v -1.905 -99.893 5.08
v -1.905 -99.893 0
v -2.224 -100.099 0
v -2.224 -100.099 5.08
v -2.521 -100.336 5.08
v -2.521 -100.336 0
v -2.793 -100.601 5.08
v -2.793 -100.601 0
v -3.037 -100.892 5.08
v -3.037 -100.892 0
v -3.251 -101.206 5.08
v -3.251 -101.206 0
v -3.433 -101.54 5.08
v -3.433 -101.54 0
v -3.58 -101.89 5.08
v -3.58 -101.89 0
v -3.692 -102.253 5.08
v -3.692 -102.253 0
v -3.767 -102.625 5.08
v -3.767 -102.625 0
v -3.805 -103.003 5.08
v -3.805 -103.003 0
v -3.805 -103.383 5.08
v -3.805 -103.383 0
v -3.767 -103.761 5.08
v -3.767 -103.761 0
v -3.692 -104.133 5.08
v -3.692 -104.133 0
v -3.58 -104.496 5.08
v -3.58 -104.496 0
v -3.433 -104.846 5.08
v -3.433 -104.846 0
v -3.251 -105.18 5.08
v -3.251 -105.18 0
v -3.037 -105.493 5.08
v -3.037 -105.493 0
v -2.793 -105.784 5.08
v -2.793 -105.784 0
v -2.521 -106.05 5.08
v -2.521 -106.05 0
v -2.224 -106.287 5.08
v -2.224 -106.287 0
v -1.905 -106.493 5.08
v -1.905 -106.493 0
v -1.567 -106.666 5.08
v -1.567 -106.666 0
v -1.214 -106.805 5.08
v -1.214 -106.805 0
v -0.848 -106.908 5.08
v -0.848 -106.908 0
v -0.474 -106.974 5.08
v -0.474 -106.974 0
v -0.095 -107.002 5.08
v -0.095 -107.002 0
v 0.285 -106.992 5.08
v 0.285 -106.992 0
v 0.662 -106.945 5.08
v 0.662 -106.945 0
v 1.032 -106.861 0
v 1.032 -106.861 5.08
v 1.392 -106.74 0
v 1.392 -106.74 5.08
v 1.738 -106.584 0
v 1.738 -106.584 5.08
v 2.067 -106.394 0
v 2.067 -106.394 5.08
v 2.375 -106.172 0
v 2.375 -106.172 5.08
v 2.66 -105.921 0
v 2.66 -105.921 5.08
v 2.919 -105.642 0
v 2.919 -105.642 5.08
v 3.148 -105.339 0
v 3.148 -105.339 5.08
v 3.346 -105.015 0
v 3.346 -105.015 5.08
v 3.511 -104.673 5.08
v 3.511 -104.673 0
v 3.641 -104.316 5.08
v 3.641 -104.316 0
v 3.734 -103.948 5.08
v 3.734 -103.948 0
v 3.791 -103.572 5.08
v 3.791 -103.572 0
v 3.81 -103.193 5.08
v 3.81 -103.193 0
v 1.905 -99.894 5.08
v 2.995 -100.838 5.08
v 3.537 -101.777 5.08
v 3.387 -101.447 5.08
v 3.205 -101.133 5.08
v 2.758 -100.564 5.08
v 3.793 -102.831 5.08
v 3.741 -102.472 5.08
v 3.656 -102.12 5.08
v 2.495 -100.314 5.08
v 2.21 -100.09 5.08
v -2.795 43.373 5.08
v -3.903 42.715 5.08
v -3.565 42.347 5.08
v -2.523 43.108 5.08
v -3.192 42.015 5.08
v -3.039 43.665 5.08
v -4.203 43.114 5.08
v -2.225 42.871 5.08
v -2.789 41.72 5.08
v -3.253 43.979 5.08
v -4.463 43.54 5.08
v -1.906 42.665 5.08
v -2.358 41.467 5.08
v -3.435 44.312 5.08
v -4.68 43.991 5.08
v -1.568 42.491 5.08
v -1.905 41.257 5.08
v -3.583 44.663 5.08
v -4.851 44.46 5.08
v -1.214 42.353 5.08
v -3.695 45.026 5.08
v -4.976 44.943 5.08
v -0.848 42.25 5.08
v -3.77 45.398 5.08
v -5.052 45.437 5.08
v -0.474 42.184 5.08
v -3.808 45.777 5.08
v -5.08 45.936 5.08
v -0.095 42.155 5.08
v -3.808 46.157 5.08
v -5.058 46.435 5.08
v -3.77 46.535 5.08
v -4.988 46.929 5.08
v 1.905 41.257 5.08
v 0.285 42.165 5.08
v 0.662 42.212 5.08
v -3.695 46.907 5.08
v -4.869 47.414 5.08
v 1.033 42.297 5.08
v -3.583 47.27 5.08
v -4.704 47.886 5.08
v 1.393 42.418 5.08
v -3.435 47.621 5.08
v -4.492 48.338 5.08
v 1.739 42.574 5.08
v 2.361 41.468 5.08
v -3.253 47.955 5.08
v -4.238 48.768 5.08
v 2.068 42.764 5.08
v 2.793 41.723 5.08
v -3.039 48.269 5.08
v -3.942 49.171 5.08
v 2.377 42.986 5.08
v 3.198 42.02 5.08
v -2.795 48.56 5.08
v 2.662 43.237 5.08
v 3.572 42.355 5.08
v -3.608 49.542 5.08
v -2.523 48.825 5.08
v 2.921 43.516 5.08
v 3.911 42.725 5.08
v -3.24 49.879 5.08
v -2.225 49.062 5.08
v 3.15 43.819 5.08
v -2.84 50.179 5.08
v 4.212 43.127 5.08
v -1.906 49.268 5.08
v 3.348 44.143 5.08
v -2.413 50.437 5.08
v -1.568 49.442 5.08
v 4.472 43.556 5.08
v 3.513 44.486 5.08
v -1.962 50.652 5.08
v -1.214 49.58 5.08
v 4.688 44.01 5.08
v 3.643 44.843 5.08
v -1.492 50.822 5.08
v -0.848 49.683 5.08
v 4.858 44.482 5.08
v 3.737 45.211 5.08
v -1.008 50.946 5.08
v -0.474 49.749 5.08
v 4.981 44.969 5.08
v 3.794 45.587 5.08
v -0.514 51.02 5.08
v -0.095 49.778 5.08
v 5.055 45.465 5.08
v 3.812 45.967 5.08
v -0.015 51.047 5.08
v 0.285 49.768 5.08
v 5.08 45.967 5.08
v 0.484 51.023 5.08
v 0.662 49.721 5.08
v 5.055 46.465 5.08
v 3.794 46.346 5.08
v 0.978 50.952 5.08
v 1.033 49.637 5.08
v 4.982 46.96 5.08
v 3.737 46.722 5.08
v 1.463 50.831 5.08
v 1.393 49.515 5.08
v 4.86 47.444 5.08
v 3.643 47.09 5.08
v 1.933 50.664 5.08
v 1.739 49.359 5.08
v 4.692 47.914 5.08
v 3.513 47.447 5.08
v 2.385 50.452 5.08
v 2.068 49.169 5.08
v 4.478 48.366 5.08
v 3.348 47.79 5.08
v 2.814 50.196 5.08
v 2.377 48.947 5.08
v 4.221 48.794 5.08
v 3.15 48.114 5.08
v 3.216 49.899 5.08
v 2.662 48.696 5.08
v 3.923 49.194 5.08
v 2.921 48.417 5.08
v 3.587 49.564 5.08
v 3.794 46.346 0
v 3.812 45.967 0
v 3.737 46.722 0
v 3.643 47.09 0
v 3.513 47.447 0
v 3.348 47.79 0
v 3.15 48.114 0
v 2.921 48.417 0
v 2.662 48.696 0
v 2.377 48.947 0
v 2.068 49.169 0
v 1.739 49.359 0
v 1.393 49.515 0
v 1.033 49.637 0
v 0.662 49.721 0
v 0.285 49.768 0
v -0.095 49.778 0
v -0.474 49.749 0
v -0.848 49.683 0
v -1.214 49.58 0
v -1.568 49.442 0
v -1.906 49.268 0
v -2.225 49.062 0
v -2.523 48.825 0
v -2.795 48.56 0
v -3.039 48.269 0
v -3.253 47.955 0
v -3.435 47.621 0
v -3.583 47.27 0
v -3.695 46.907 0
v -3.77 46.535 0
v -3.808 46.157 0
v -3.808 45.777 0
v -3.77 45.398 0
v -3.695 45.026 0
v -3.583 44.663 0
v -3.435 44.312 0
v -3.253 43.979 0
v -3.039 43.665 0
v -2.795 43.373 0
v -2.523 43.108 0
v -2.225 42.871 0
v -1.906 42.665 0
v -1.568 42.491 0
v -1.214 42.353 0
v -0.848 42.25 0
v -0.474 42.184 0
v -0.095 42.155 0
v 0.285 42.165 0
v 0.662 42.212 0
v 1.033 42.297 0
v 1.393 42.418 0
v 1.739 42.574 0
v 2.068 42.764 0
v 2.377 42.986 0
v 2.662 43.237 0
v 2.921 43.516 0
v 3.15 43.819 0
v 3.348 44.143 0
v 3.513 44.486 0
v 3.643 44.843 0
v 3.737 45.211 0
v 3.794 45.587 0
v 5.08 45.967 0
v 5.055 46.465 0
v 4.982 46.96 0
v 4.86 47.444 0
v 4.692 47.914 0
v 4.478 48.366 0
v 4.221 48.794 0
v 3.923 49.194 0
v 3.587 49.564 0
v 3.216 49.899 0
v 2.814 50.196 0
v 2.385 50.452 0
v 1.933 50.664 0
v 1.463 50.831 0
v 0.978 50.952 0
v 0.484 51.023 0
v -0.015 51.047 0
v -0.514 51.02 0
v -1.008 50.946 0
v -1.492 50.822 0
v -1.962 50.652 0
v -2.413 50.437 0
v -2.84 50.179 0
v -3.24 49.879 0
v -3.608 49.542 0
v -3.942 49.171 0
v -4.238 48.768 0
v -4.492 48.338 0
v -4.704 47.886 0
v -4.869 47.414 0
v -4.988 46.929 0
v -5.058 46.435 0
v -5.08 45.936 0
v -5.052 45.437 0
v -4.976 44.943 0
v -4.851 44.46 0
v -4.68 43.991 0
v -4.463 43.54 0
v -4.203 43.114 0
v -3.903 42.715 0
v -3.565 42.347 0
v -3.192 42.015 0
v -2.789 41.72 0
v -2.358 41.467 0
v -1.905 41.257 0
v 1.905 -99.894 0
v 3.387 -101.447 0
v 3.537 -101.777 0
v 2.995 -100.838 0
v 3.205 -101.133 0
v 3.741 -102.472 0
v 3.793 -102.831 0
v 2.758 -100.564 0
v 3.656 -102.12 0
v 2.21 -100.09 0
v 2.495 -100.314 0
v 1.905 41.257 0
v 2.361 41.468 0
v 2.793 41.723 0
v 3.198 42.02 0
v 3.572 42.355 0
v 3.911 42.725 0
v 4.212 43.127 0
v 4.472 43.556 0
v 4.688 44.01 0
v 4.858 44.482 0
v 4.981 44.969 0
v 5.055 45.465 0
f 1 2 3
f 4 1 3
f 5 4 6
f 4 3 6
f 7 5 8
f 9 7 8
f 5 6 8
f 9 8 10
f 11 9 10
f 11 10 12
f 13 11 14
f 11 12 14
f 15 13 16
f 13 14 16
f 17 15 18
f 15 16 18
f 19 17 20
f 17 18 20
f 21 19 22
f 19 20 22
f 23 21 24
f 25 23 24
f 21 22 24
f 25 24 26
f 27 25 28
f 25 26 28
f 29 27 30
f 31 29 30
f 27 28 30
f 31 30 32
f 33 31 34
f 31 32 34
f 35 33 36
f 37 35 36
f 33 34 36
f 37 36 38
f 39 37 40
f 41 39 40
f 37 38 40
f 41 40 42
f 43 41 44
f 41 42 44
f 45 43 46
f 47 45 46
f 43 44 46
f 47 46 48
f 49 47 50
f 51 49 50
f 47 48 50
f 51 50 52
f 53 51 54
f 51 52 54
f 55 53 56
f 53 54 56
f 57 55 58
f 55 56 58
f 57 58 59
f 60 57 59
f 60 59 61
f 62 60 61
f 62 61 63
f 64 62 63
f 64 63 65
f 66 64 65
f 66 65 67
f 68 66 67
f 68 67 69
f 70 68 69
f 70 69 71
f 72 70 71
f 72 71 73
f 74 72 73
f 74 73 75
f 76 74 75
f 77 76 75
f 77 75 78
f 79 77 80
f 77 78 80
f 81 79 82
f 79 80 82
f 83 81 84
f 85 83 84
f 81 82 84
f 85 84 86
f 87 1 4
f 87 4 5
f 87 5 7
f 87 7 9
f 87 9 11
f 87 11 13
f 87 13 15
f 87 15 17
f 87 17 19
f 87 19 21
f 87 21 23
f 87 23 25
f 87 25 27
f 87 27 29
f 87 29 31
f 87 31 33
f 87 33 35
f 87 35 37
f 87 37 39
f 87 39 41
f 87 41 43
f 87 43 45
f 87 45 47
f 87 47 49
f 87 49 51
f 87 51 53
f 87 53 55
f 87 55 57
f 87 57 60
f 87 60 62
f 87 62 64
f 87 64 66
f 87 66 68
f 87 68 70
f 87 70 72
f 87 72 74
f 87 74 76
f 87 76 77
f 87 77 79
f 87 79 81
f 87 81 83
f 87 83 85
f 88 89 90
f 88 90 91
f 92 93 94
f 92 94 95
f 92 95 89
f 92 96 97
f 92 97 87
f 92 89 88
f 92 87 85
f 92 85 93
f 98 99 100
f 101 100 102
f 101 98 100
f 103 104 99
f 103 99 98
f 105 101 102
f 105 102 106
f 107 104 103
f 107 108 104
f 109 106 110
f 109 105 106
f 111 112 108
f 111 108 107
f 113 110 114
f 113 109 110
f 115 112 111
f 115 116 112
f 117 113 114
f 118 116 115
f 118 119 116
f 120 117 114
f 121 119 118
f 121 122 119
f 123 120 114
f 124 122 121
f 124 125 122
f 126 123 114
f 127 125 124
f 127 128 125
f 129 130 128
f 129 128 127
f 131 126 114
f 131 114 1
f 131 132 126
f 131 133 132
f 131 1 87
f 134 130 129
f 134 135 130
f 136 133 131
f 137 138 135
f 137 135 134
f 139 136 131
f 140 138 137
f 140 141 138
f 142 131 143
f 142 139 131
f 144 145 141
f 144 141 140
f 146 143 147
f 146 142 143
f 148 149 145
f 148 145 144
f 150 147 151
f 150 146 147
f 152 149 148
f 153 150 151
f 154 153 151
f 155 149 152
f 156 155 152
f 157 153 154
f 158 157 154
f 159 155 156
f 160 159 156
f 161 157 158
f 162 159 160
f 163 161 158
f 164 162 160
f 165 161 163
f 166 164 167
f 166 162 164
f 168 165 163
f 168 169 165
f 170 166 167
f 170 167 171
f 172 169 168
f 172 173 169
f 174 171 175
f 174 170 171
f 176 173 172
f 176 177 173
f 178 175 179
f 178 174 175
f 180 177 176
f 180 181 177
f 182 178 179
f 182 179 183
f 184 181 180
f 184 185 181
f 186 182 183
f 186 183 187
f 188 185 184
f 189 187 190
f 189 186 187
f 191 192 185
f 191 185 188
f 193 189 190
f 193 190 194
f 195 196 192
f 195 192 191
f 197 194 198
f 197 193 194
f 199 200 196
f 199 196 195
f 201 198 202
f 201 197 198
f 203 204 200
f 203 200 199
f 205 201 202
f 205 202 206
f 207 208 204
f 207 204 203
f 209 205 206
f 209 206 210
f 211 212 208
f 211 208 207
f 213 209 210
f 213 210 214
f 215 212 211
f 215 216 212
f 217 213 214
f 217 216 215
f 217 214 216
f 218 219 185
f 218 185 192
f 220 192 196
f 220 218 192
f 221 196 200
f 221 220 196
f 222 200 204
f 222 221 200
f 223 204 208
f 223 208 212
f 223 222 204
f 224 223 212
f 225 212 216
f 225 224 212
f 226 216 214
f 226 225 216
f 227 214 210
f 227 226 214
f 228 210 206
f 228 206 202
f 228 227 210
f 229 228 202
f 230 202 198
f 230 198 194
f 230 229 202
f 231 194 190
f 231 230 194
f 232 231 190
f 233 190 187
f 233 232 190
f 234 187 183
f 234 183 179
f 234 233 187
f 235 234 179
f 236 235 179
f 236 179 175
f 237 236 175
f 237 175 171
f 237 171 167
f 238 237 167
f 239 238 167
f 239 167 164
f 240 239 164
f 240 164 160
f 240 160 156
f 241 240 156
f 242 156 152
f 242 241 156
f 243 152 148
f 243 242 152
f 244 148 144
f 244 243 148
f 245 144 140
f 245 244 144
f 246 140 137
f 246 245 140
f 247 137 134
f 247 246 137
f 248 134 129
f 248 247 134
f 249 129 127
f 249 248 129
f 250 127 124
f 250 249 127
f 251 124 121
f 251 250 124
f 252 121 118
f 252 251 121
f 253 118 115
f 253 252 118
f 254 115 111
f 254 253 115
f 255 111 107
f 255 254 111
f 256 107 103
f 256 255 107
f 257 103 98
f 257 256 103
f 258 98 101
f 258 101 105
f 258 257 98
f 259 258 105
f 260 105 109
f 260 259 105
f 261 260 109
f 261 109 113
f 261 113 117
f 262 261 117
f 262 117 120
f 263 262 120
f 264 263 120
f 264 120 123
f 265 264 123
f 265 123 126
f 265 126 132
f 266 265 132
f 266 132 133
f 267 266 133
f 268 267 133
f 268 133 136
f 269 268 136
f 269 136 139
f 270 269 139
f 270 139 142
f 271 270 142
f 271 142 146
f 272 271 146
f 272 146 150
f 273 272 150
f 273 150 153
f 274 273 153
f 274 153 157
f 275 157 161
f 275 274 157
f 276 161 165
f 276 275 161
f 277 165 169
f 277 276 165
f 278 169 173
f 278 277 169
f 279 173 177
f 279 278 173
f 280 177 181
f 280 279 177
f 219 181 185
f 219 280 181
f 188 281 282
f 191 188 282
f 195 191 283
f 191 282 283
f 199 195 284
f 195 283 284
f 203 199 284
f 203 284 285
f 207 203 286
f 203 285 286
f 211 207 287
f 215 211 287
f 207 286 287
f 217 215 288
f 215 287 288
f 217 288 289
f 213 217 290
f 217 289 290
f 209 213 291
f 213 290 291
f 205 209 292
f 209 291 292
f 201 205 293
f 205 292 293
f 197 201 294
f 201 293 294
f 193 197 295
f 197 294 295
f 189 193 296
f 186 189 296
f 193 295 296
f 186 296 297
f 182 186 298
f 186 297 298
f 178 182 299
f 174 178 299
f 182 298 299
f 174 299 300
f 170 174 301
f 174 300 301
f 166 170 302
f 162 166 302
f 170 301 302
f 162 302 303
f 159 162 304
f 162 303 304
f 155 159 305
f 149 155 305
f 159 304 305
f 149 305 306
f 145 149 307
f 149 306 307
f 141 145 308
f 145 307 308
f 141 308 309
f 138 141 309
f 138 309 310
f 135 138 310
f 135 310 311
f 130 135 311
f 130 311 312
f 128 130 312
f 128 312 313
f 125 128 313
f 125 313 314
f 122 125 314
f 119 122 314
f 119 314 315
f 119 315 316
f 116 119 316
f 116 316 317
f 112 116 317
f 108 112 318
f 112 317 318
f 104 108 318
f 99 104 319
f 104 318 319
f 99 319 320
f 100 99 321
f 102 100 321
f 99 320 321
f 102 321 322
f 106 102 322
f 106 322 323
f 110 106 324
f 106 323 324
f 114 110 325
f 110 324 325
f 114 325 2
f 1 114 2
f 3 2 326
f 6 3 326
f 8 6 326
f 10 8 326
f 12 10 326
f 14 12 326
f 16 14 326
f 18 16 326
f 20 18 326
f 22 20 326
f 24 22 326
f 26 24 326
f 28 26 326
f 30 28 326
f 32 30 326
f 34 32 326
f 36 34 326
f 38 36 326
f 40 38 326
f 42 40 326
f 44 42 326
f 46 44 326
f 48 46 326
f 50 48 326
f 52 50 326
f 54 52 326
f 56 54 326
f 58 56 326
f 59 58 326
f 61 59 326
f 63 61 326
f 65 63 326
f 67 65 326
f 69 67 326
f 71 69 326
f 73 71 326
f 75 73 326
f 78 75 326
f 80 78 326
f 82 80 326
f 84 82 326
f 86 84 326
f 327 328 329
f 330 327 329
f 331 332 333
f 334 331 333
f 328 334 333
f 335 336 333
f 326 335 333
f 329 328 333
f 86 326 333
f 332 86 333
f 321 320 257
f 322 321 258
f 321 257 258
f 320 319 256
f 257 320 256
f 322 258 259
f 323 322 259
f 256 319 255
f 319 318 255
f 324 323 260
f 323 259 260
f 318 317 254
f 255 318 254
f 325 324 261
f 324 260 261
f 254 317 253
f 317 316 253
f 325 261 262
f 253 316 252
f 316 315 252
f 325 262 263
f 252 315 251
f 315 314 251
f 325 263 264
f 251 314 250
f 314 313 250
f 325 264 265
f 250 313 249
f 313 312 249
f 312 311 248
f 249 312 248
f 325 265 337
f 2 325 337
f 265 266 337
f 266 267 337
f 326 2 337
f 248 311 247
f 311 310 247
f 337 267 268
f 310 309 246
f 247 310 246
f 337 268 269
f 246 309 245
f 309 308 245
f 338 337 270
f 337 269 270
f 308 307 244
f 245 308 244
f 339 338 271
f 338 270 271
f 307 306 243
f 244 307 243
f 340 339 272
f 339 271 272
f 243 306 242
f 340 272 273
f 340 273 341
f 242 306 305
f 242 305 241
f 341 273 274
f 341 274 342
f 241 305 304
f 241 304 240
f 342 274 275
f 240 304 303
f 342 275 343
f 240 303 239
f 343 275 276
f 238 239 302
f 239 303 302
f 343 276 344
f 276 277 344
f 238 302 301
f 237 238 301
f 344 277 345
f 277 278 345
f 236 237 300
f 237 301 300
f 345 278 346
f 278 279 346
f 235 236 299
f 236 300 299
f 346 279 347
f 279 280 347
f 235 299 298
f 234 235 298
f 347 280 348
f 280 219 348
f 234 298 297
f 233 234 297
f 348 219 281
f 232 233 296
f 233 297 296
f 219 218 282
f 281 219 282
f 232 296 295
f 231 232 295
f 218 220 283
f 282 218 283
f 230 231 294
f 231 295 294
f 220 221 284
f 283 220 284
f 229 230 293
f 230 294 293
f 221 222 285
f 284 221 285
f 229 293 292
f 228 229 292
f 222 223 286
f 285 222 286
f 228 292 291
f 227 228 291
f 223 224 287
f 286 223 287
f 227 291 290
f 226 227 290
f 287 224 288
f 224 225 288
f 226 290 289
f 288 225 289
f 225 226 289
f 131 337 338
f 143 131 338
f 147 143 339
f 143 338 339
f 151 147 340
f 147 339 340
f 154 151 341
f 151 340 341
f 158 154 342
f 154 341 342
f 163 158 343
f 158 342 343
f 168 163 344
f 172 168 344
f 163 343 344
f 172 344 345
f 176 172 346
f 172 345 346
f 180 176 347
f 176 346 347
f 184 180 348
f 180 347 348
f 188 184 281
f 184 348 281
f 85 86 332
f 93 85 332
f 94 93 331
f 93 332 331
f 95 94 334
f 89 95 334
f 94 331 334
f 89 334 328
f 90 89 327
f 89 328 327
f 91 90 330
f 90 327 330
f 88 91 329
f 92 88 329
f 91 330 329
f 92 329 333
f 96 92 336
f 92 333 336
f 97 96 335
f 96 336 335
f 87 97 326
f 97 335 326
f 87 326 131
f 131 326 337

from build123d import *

# Parameters (mm, degrees)
F0_R     = 3.812453
F1_DEPTH = 5.08


with BuildPart() as f1:
    # F0 (on Top) → F1 (new body)
    with BuildSketch(Plane.XY):
        with BuildLine():
            ThreePointArc((1.905218, 41.257359), (4.212179, 43.126849), (5.08, 45.966557))
            ThreePointArc((5.08, 45.966557), (-2.839904, 50.178605), (-1.904782, 41.257183))
            ThreePointArc((-1.904782, 41.257183), (0.000236, 40.886557), (1.905218, 41.257359))
        make_face()
        with Locations((0, 45.966557)):
            Circle(F0_R, mode=Mode.SUBTRACT)
        with BuildLine():
            ThreePointArc((1.905218, 41.257359), (0.000236, 40.886557), (-1.904782, 41.257183))
            Line((-1.904782, 41.257183), (-1.904782, 40.316892))
            Line((-1.904782, 40.316892), (1.905218, 40.316892))
            Line((1.905218, 40.316892), (1.905218, 41.257359))
        make_face()
        Polygon((1.905218, 40.316892), (-1.904782, 40.316892), (-1.904782, -99.383108), (0, -99.383108), (1.905218, -99.383108), align=None)
        with BuildLine():
            Line((0, -99.383108), (-1.904782, -99.383108))
            Line((-1.904782, -99.383108), (-1.904782, -99.893425))
            ThreePointArc((-1.904782, -99.893425), (-0.985979, -99.512898), (0, -99.383108))
        make_face()
        with BuildLine():
            Line((1.905218, -99.893677), (1.905218, -99.383108))
            Line((1.905218, -99.383108), (0, -99.383108))
            ThreePointArc((0, -99.383108), (0.986222, -99.512963), (1.905218, -99.893677))
        make_face()
        with BuildLine():
            ThreePointArc((1.905218, -99.893677), (0.986222, -99.512963), (0, -99.383108))
            ThreePointArc((0, -99.383108), (-0.985979, -99.512898), (-1.904782, -99.893425))
            ThreePointArc((-1.904782, -99.893425), (-1.905109, -106.492602), (3.81, -103.193108))
            ThreePointArc((3.81, -103.193108), (3.29962, -101.288217), (1.905218, -99.893677))
        make_face()
    extrude(amount=F1_DEPTH)


solid = f1.part
